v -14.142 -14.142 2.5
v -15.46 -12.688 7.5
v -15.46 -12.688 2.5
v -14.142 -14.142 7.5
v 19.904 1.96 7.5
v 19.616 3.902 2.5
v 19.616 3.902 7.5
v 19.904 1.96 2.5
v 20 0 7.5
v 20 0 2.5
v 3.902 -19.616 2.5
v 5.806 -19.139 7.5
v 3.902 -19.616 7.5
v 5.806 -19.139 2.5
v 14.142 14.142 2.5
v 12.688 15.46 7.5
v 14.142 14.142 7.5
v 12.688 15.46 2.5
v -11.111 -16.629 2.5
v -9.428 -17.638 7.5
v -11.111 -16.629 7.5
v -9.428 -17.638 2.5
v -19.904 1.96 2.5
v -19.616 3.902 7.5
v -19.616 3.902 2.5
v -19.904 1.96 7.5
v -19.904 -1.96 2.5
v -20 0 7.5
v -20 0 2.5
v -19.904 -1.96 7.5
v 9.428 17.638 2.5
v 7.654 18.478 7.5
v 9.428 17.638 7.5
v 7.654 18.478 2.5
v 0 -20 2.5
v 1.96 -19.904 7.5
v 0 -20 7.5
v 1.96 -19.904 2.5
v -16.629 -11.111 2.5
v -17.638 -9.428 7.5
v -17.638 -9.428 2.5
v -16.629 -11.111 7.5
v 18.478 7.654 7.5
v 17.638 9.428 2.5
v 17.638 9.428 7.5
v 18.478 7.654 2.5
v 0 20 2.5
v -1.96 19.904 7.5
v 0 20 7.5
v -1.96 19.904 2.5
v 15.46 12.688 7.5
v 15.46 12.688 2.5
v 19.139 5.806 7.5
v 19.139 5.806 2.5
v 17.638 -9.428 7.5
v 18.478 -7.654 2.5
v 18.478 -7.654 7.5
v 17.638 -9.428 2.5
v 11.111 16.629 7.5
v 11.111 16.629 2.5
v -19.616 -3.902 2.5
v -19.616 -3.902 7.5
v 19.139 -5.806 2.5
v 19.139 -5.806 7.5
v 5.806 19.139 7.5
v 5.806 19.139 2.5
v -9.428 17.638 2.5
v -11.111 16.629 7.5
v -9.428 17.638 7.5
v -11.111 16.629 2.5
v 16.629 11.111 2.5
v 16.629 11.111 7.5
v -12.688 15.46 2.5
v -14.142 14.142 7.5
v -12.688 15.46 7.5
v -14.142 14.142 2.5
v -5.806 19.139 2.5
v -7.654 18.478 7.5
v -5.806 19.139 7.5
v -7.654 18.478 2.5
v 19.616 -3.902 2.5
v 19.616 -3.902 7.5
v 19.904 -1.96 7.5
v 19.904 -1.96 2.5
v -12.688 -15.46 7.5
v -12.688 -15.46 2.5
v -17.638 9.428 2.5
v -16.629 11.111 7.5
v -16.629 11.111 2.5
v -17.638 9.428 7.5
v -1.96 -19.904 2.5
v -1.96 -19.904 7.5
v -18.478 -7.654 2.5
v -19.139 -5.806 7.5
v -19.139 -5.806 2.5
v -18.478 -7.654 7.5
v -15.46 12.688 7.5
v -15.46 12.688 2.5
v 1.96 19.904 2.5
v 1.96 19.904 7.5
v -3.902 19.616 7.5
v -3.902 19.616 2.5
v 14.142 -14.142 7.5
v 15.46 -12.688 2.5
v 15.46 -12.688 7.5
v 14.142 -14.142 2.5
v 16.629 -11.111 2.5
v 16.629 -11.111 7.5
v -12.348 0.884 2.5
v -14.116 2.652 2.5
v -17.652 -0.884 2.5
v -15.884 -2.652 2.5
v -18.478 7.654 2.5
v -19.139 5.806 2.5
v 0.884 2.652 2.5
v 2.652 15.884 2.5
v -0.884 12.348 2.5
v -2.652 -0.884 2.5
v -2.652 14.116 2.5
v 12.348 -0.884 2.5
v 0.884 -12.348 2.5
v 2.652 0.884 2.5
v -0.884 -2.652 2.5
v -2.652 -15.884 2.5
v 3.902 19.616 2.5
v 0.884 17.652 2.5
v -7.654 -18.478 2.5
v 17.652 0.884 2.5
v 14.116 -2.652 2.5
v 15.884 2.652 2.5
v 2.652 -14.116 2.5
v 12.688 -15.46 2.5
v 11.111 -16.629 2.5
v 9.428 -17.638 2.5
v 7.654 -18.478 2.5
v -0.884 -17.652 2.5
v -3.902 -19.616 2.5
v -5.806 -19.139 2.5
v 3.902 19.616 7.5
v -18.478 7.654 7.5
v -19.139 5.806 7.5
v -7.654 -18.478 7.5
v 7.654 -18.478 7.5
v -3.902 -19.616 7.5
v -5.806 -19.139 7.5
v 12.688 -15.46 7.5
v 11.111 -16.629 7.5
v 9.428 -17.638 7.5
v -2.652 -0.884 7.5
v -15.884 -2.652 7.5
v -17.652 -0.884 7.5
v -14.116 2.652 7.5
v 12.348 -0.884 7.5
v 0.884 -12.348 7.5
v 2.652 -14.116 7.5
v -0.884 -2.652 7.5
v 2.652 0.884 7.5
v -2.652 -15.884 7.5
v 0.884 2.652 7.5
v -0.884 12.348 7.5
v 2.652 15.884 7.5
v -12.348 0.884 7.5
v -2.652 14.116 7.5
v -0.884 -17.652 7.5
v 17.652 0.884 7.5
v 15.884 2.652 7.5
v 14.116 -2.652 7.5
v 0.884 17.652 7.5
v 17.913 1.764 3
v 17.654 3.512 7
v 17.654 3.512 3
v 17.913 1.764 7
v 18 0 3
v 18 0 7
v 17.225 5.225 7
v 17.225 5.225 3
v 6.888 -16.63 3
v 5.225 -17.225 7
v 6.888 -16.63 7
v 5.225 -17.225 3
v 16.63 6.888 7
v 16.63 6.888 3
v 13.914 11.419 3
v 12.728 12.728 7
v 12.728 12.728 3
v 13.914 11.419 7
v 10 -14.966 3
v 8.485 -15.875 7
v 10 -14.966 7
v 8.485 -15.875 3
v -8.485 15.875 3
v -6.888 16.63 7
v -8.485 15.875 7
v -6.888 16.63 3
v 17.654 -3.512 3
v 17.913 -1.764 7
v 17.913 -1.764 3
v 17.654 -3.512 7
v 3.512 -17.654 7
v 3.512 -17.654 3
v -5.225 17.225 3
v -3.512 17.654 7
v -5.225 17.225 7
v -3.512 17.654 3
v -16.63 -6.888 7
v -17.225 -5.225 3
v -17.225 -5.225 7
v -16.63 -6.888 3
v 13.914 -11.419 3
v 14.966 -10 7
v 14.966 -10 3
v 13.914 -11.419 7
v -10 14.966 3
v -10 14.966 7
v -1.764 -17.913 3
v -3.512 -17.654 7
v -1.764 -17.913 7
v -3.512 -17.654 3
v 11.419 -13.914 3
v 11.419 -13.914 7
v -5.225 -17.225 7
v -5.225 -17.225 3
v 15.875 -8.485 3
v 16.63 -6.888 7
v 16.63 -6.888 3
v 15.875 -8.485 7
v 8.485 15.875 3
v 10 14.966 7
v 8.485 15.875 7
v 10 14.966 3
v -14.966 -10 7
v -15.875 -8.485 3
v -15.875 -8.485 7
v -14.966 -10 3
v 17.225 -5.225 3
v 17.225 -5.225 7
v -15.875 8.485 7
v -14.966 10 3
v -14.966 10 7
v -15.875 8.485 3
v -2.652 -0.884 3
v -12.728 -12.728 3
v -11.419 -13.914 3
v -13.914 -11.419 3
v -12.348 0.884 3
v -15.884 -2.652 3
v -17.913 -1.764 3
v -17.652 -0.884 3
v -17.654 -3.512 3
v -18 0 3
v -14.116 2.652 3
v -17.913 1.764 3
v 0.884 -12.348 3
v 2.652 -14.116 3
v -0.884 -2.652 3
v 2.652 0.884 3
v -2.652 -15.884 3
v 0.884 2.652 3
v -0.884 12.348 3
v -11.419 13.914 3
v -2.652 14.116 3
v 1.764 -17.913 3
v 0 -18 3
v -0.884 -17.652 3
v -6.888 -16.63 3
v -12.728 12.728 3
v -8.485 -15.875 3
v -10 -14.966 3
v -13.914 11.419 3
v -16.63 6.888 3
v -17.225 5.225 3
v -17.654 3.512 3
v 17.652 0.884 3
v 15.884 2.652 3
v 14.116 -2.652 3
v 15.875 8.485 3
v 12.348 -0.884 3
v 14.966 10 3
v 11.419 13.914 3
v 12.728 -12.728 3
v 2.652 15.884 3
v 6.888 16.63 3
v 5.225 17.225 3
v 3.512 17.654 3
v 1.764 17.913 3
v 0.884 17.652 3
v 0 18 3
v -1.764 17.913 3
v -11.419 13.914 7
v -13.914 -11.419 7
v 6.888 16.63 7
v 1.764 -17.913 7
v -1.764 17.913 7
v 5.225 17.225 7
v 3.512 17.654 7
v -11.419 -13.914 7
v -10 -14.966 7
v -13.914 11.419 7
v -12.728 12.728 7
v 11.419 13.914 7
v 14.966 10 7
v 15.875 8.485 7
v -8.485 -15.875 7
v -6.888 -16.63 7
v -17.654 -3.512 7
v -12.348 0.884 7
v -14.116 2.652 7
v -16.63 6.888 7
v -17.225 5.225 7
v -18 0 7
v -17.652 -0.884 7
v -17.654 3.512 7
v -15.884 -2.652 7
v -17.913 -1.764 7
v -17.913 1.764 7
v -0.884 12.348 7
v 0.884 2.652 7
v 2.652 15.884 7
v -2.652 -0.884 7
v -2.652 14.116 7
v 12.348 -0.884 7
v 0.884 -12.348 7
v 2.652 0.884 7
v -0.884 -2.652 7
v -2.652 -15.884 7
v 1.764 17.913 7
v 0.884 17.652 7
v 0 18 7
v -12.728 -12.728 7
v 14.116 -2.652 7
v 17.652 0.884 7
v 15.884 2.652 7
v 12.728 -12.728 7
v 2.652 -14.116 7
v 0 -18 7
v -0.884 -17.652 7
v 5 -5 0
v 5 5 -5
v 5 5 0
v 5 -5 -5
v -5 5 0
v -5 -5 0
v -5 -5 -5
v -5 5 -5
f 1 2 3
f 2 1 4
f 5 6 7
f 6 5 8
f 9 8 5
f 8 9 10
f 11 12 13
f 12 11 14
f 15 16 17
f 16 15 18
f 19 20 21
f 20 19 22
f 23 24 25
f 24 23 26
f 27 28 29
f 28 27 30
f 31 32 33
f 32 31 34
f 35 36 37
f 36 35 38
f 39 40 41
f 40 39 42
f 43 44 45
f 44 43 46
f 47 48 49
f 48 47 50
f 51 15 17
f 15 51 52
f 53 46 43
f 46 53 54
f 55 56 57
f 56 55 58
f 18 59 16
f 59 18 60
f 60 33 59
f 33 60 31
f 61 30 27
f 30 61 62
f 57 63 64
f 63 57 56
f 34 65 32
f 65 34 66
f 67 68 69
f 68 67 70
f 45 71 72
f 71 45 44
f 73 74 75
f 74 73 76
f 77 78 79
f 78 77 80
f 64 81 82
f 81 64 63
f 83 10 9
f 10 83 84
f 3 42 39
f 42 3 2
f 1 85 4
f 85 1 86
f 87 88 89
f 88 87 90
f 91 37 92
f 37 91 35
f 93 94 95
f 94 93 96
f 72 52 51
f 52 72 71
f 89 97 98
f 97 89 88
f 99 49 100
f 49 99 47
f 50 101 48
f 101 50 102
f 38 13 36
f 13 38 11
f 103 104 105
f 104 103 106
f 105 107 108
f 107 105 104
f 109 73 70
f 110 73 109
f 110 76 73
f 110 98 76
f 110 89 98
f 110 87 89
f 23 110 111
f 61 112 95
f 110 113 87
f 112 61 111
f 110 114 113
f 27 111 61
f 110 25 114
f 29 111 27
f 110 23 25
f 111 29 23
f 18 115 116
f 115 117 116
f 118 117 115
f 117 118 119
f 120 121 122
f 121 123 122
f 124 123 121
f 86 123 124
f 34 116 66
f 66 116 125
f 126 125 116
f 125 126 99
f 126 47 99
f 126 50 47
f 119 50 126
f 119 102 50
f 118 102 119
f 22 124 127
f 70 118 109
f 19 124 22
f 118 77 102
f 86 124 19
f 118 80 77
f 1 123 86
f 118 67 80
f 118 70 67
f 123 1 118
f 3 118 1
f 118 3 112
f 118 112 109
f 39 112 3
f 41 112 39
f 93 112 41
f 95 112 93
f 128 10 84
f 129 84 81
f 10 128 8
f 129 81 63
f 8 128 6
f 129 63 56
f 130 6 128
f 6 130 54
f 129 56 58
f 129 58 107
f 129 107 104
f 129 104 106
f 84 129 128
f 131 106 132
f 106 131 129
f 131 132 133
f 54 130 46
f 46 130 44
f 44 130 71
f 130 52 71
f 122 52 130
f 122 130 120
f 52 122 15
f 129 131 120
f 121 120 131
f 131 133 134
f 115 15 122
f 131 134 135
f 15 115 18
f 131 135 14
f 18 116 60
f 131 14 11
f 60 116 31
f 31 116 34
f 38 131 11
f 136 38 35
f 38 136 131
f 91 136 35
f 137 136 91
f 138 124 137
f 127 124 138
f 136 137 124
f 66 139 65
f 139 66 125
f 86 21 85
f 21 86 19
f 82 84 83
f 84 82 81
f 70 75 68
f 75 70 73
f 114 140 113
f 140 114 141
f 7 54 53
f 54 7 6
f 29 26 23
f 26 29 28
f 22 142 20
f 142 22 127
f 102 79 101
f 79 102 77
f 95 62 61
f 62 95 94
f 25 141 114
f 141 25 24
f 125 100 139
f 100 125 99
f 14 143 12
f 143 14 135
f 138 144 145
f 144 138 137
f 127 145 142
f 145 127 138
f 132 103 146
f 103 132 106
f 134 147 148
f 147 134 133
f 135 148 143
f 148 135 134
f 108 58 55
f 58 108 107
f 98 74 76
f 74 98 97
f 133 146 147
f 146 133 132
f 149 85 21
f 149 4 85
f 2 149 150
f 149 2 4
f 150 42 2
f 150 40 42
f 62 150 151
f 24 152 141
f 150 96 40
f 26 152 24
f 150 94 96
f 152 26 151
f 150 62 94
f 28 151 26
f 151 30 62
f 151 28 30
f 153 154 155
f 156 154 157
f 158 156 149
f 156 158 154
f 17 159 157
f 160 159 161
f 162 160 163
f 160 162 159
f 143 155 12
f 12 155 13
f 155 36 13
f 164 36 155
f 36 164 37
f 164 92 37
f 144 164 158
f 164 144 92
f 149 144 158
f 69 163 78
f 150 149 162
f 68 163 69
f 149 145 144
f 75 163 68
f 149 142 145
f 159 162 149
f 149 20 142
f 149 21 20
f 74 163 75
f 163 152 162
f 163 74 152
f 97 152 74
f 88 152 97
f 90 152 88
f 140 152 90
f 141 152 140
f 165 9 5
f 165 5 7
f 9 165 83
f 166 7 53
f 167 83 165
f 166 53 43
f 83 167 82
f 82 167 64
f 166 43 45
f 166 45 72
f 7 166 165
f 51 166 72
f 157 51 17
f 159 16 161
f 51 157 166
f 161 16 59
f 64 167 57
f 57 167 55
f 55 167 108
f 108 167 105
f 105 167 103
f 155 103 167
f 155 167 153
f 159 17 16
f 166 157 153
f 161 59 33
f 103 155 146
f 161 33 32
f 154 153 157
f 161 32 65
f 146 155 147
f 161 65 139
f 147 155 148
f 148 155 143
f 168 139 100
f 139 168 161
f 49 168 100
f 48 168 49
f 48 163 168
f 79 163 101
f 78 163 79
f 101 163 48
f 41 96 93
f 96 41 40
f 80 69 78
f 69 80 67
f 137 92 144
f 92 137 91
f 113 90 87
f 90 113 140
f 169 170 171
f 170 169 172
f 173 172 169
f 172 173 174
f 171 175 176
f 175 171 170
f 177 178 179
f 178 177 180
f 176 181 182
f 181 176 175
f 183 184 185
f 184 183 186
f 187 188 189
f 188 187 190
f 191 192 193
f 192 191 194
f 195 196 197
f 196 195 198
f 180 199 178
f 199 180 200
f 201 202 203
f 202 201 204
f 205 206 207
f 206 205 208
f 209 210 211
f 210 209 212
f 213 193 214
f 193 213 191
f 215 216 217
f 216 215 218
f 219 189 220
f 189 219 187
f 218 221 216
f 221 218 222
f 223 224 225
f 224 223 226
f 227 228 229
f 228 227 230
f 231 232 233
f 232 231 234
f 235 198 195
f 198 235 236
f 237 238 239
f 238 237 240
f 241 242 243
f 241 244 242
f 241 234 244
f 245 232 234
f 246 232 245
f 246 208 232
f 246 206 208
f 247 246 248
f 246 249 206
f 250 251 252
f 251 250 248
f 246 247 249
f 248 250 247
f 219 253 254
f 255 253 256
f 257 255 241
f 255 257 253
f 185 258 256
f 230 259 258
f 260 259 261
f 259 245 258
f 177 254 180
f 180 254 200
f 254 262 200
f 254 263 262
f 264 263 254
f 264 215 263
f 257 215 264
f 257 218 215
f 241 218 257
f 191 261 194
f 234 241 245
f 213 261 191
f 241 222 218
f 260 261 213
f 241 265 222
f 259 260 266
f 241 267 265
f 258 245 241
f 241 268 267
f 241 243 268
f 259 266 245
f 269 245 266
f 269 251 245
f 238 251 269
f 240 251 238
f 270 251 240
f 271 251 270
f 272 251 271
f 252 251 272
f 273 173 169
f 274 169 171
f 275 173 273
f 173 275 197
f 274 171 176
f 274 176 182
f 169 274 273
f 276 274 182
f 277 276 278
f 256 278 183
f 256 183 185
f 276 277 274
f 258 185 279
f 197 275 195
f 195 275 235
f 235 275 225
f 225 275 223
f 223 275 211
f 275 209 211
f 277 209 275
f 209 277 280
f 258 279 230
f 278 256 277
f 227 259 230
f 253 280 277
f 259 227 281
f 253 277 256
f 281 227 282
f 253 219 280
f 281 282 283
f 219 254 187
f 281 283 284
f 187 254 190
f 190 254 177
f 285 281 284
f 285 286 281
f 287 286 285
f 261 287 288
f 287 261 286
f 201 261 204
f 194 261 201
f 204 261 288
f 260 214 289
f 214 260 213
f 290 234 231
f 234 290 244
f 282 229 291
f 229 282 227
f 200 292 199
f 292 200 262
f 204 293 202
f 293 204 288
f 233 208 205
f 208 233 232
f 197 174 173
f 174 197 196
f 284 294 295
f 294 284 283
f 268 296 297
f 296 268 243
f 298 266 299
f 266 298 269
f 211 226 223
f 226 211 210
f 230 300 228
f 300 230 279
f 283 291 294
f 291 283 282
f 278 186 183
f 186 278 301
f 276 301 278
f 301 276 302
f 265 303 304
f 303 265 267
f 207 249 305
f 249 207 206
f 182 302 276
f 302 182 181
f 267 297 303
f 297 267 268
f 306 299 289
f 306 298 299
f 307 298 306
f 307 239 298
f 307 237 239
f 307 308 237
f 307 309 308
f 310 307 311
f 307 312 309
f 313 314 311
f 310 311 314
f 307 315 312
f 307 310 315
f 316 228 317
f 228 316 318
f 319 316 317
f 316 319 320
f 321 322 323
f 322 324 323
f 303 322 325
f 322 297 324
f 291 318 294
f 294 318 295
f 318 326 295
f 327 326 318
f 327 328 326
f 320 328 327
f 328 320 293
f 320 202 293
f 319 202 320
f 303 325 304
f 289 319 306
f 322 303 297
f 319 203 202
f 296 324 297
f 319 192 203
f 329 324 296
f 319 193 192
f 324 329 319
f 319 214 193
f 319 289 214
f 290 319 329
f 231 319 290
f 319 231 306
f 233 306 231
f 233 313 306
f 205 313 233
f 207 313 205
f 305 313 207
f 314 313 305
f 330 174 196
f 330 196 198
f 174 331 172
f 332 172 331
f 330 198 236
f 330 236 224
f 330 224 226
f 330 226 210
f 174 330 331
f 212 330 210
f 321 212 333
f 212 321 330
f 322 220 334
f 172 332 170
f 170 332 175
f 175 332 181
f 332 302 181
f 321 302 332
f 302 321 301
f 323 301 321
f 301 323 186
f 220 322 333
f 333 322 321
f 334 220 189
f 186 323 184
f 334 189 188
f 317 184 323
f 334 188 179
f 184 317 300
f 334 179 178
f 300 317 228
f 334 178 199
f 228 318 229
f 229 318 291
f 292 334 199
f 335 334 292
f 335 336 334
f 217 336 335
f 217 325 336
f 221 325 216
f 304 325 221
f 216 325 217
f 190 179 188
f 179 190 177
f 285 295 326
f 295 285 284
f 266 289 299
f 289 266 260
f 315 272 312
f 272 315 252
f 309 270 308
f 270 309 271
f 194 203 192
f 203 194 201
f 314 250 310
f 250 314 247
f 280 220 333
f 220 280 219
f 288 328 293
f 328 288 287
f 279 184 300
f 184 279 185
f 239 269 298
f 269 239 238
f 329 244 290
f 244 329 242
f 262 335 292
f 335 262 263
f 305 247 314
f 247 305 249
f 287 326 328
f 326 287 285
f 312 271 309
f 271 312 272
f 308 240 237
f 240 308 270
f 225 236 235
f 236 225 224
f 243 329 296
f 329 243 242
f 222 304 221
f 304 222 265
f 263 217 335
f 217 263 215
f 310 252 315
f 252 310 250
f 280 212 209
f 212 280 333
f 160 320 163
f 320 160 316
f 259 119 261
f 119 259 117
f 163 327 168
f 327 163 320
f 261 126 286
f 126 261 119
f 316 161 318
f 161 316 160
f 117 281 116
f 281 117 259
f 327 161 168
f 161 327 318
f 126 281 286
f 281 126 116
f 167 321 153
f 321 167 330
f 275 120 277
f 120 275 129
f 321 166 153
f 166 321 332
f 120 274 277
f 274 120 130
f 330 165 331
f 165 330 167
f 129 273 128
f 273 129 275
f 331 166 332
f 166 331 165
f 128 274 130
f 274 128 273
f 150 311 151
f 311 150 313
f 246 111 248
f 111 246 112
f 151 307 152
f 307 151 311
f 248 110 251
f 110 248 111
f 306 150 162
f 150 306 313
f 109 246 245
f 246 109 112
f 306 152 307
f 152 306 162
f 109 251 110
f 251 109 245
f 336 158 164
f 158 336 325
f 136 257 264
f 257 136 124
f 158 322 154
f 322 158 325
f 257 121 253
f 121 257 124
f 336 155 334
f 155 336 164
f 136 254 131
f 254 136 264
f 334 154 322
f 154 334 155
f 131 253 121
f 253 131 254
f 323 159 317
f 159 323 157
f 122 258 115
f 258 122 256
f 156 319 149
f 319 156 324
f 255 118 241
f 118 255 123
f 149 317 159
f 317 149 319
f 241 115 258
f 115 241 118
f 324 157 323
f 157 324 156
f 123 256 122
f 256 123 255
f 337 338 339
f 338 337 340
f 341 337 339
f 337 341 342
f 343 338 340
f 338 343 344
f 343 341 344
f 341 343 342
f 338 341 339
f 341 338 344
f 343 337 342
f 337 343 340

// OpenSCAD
module diamond_cutout(size, thickness) {
    rotate([0, 0, 45])
    scale([1, 0.5, 1])
    cube([size, size, thickness], center=true);
}

module circular_disk_with_features() {
    difference() {
        // Main disk
        union() {
            cylinder(h=5, r=20, $fn=64);
            translate([0, 0, 2.5])
                cube([10, 10, 5], center=true);
        }
        // Recessed rim
        translate([0, 0, 0.5])
            cylinder(h=4, r=18, $fn=64);
        // Diamond cutouts
        translate([0, 15, 2.5])
            diamond_cutout(5, 5);
        translate([15, 0, 2.5])
            diamond_cutout(5, 5);
        translate([-15, 0, 2.5])
            diamond_cutout(5, 5);
        translate([0, -15, 2.5])
            diamond_cutout(5, 5);
        translate([0, 0, 2.5])
            diamond_cutout(5, 5);
    }
}

module square_peg() {
    translate([0, 0, -5])
        cube([10, 10, 5], center=true);
}

translate([0, 0, 2.5])
    union() {
        circular_disk_with_features();
        square_peg();
    }
